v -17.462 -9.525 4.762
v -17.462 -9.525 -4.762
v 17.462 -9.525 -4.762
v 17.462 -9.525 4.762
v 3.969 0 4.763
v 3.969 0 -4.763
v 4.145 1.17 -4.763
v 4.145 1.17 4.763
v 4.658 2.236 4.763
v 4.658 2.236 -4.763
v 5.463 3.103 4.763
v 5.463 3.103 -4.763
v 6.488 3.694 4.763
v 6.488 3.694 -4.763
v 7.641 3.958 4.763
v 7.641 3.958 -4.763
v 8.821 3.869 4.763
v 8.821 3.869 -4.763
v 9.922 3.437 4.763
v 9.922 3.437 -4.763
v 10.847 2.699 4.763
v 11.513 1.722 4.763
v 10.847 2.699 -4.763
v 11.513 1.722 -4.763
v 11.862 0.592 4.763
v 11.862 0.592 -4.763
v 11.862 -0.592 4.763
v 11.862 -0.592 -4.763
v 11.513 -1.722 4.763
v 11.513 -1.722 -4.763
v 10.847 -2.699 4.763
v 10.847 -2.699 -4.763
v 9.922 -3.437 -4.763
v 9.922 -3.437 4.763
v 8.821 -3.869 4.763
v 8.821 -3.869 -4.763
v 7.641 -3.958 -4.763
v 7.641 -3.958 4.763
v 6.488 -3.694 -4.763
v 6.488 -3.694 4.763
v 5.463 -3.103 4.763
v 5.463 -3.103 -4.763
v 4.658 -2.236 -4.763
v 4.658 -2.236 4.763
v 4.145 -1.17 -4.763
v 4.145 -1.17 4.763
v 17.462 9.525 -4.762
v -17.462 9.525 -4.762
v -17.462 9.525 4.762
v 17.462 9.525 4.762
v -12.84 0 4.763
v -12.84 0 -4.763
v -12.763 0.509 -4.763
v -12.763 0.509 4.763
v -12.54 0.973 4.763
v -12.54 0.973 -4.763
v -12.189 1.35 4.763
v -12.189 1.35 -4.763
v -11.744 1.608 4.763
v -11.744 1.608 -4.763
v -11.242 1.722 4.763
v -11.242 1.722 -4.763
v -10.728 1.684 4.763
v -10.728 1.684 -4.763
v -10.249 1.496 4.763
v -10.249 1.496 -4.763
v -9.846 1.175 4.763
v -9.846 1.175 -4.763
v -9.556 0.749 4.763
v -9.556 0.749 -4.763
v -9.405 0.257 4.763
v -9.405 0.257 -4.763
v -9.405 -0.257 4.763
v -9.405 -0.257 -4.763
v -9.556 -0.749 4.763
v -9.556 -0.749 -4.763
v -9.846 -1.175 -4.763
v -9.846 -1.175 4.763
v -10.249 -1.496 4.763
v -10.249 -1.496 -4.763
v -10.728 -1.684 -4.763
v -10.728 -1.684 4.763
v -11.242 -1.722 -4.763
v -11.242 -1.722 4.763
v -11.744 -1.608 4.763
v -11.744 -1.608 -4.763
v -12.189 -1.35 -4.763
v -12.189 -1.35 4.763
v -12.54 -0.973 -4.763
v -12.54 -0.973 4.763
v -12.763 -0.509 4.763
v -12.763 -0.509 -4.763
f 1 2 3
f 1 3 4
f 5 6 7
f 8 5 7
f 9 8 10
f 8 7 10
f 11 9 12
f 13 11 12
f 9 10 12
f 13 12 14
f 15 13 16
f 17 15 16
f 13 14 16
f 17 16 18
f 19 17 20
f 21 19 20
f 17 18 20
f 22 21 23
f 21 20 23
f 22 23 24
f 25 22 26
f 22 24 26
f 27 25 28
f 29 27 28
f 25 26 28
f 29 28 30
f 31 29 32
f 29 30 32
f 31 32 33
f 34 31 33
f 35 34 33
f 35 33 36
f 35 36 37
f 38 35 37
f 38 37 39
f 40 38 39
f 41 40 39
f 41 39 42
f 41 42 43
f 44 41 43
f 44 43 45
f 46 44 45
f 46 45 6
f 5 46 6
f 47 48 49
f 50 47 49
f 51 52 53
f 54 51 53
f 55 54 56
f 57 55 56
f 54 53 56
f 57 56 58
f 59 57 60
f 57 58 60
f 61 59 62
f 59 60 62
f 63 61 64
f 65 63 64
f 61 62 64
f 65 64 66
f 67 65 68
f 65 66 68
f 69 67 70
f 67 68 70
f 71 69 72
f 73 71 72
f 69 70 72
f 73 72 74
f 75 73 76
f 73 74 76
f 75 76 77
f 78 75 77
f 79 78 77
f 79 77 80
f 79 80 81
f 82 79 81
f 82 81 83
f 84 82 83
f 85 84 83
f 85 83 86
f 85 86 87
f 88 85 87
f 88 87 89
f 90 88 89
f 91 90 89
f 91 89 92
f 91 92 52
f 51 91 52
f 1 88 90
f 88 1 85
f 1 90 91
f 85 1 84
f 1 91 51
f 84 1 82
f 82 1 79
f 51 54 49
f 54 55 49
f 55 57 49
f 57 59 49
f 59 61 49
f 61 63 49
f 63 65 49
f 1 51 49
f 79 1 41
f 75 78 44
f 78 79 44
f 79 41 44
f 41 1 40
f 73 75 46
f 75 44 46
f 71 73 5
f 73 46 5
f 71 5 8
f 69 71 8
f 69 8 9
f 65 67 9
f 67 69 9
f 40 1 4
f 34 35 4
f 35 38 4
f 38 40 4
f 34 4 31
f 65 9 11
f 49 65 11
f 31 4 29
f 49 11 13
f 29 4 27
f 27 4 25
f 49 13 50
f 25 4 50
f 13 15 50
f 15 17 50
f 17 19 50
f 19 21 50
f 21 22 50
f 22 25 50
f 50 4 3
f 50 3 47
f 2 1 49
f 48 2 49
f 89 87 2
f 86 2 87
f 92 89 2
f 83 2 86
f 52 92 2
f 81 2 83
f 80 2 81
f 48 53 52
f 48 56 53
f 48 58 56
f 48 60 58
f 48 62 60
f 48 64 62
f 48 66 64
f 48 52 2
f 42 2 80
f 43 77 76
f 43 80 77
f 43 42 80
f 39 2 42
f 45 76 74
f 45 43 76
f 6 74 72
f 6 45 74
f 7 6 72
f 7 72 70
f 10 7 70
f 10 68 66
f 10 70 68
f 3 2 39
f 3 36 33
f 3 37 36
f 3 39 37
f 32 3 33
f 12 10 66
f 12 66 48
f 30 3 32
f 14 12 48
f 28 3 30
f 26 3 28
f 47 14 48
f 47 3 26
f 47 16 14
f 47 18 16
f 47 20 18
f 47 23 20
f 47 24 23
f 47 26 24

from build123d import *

# Parameters (mm, degrees)
F0_W     = 19.05
F0_H     = 9.525
F1_DEPTH = 17.4625
F3_D     = 7.9375
F5_D     = 3.4544


with BuildPart() as f1:
    # F0 (on Right) → F1 (new body, symmetric)
    with BuildSketch(Plane.YZ):
        Rectangle(F0_W, F0_H)
    extrude(amount=F1_DEPTH, both=True)

    # F3 (through all)
    with Locations(Plane.XY.offset(4.7625)):
        with Locations((7.9375, 0)):
            Hole(F3_D / 2)

    # F5 (through all)
    with Locations(Plane.XY.offset(4.7625)):
        with Locations((-11.1125, 0)):
            Hole(F5_D / 2)


solid = f1.part
